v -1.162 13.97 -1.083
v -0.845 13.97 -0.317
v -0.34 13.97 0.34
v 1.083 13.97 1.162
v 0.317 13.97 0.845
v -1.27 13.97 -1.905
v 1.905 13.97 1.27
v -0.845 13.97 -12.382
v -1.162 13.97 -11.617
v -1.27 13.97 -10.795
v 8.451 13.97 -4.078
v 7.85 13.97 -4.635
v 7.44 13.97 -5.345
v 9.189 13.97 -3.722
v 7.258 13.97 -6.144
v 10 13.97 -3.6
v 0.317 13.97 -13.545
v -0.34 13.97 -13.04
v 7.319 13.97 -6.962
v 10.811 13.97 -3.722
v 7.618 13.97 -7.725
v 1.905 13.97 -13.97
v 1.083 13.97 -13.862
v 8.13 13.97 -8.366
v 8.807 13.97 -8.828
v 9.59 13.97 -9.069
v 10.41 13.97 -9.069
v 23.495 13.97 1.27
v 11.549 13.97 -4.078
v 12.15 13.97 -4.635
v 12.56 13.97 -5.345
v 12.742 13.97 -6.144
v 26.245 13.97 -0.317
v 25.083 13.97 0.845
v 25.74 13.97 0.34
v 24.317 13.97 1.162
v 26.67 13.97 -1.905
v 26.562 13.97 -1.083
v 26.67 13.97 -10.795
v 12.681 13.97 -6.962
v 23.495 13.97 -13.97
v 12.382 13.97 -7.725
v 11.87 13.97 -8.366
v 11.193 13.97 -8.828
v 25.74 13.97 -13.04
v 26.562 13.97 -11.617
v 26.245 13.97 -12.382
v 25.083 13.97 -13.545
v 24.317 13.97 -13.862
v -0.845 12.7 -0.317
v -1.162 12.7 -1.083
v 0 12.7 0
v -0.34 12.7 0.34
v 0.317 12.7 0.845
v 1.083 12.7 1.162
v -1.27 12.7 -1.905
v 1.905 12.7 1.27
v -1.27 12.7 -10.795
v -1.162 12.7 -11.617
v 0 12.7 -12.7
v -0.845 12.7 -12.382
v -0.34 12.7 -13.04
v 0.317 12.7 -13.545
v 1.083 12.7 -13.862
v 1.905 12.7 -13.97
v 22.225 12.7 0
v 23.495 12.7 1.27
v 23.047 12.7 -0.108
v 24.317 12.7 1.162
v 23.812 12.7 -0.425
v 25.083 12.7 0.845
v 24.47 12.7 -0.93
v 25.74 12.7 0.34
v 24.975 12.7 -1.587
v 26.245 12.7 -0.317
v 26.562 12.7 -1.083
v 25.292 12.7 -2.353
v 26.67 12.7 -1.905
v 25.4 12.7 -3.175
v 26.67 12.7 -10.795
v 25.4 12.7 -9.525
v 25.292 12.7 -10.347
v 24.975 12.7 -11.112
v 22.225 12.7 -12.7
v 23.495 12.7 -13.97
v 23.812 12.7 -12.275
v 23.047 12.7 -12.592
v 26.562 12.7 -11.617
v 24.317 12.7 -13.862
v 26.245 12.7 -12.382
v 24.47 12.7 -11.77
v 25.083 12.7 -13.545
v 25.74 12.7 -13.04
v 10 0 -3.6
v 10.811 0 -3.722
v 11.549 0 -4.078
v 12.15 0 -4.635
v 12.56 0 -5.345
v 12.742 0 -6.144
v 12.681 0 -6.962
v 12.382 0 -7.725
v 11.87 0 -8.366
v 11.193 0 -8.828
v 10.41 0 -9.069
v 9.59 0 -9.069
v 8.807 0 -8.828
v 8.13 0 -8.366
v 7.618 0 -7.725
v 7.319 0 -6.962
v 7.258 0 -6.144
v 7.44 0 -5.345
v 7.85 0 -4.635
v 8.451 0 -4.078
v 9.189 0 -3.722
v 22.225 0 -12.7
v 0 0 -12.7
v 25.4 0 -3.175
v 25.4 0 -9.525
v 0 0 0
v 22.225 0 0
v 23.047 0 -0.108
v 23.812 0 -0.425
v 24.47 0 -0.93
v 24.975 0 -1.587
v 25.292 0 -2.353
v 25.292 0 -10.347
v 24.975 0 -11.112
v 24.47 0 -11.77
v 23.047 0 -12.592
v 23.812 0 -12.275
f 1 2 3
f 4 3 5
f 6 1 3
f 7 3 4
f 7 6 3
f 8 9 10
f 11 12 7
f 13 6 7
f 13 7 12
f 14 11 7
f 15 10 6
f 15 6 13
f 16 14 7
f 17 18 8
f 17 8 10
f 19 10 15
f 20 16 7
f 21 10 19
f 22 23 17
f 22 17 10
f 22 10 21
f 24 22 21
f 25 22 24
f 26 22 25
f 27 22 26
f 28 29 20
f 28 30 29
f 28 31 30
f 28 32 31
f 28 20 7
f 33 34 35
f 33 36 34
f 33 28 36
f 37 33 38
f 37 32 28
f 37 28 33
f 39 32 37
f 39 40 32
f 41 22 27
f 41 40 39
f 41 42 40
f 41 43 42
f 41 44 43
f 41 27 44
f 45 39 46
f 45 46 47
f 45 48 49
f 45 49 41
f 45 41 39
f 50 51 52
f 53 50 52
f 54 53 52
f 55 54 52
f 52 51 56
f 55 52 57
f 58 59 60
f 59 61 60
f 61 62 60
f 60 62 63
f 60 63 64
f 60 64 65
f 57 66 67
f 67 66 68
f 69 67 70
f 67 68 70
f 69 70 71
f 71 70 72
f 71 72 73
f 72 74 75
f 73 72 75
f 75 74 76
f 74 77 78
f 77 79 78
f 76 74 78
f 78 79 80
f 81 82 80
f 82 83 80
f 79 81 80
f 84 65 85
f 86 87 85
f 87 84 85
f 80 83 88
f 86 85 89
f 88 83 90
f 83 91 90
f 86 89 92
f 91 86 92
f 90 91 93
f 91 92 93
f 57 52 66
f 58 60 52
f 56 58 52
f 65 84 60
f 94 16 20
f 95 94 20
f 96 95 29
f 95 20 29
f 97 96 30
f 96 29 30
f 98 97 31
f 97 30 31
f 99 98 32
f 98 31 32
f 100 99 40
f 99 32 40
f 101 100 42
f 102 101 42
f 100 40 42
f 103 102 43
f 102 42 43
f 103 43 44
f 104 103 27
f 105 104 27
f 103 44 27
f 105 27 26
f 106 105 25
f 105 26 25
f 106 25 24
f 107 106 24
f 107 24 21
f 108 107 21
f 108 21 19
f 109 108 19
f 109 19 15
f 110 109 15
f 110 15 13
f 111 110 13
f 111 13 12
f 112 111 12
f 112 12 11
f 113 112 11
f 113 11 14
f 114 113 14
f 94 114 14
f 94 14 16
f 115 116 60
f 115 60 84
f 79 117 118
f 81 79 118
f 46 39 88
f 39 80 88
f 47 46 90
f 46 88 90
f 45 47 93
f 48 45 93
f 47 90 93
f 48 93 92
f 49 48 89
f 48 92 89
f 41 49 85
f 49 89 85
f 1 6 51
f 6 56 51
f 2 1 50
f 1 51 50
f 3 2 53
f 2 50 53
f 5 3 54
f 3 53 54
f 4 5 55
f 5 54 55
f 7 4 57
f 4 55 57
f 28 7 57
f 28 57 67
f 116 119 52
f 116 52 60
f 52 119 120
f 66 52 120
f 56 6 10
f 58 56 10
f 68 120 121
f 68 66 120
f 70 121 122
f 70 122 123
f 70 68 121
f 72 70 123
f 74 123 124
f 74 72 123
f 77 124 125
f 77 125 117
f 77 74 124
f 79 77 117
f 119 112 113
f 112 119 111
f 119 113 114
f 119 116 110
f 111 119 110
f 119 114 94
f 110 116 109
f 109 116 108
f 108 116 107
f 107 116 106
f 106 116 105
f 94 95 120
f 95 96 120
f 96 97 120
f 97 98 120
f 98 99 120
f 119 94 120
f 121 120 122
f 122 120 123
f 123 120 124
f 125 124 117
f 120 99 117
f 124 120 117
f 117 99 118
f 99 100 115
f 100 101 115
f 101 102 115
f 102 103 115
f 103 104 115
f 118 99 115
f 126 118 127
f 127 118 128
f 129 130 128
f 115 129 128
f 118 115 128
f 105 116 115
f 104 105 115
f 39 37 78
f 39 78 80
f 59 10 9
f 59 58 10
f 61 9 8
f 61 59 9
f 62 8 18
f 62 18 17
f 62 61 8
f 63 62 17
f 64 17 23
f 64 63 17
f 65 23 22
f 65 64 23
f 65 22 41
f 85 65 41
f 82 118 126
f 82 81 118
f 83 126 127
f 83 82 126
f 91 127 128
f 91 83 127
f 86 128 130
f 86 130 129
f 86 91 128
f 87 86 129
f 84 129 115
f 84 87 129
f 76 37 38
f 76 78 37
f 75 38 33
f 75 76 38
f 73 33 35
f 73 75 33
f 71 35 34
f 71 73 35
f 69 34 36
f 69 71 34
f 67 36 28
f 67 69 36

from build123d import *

# Parameters (mm, degrees)
SKETCH1_W           = 25.4
SKETCH1_H           = 12.7
BOSS_EXTRUDE1_DEPTH = 12.7
FILLET1_R           = 3.175
SKETCH2_R           = 2.75
CUT_EXTRUDE1_DEPTH  = 32.108519733
BOSS_EXTRUDE2_START = 1.27
SKETCH3_W           = 27.94
SKETCH3_H           = 15.24
SKETCH3_R           = 2.75
BOSS_EXTRUDE2_DEPTH = 1.27
FILLET2_R           = 3.175


with BuildPart() as part:
    # Sketch1 → Boss-Extrude1 (new body)
    with BuildSketch(Plane(origin=(0, 0, 0), x_dir=(1, 0, 0), z_dir=(0, 1, 0))):
        with Locations((12.7, 6.35)):
            Rectangle(SKETCH1_W, SKETCH1_H)
    extrude(amount=BOSS_EXTRUDE1_DEPTH)

    # Fillet1
    fillet1_edges = [part.edges().sort_by_distance(p)[0] for p in [
        (25.4, 6.35, -12.7),
        (25.4, 6.35, 0),
    ]]
    fillet(fillet1_edges, radius=FILLET1_R)

    # Sketch2 → Cut-Extrude1 (cut, through all)
    with BuildSketch(Plane(origin=(0, 12.7, 0), x_dir=(1, 0, 0), z_dir=(0, 1, 0))):
        with Locations(Location((10, 6.35, 0), (0, 0, 270))):
            Circle(SKETCH2_R)
    extrude(amount=-CUT_EXTRUDE1_DEPTH, mode=Mode.SUBTRACT)

    # Sketch3 → Boss-Extrude2 (add)
    with BuildSketch(Plane(origin=(0, 12.7, 0), x_dir=(1, 0, 0), z_dir=(0, 1, 0)).offset(BOSS_EXTRUDE2_START)):
        with Locations((12.7, 6.35)):
            Rectangle(SKETCH3_W, SKETCH3_H)
        with Locations(Location((10, 6.35, 0), (0, 0, 270))):
            Circle(SKETCH3_R, mode=Mode.SUBTRACT)
    extrude(amount=-BOSS_EXTRUDE2_DEPTH)

    # Fillet2
    fillet2_edges = [part.edges().sort_by_distance(p)[0] for p in [
        (-1.27, 13.335, -13.97),
        (-1.27, 13.335, 1.27),
        (26.67, 13.335, 1.27),
        (26.67, 13.335, -13.97),
    ]]
    fillet(fillet2_edges, radius=FILLET2_R)


solid = part.part
